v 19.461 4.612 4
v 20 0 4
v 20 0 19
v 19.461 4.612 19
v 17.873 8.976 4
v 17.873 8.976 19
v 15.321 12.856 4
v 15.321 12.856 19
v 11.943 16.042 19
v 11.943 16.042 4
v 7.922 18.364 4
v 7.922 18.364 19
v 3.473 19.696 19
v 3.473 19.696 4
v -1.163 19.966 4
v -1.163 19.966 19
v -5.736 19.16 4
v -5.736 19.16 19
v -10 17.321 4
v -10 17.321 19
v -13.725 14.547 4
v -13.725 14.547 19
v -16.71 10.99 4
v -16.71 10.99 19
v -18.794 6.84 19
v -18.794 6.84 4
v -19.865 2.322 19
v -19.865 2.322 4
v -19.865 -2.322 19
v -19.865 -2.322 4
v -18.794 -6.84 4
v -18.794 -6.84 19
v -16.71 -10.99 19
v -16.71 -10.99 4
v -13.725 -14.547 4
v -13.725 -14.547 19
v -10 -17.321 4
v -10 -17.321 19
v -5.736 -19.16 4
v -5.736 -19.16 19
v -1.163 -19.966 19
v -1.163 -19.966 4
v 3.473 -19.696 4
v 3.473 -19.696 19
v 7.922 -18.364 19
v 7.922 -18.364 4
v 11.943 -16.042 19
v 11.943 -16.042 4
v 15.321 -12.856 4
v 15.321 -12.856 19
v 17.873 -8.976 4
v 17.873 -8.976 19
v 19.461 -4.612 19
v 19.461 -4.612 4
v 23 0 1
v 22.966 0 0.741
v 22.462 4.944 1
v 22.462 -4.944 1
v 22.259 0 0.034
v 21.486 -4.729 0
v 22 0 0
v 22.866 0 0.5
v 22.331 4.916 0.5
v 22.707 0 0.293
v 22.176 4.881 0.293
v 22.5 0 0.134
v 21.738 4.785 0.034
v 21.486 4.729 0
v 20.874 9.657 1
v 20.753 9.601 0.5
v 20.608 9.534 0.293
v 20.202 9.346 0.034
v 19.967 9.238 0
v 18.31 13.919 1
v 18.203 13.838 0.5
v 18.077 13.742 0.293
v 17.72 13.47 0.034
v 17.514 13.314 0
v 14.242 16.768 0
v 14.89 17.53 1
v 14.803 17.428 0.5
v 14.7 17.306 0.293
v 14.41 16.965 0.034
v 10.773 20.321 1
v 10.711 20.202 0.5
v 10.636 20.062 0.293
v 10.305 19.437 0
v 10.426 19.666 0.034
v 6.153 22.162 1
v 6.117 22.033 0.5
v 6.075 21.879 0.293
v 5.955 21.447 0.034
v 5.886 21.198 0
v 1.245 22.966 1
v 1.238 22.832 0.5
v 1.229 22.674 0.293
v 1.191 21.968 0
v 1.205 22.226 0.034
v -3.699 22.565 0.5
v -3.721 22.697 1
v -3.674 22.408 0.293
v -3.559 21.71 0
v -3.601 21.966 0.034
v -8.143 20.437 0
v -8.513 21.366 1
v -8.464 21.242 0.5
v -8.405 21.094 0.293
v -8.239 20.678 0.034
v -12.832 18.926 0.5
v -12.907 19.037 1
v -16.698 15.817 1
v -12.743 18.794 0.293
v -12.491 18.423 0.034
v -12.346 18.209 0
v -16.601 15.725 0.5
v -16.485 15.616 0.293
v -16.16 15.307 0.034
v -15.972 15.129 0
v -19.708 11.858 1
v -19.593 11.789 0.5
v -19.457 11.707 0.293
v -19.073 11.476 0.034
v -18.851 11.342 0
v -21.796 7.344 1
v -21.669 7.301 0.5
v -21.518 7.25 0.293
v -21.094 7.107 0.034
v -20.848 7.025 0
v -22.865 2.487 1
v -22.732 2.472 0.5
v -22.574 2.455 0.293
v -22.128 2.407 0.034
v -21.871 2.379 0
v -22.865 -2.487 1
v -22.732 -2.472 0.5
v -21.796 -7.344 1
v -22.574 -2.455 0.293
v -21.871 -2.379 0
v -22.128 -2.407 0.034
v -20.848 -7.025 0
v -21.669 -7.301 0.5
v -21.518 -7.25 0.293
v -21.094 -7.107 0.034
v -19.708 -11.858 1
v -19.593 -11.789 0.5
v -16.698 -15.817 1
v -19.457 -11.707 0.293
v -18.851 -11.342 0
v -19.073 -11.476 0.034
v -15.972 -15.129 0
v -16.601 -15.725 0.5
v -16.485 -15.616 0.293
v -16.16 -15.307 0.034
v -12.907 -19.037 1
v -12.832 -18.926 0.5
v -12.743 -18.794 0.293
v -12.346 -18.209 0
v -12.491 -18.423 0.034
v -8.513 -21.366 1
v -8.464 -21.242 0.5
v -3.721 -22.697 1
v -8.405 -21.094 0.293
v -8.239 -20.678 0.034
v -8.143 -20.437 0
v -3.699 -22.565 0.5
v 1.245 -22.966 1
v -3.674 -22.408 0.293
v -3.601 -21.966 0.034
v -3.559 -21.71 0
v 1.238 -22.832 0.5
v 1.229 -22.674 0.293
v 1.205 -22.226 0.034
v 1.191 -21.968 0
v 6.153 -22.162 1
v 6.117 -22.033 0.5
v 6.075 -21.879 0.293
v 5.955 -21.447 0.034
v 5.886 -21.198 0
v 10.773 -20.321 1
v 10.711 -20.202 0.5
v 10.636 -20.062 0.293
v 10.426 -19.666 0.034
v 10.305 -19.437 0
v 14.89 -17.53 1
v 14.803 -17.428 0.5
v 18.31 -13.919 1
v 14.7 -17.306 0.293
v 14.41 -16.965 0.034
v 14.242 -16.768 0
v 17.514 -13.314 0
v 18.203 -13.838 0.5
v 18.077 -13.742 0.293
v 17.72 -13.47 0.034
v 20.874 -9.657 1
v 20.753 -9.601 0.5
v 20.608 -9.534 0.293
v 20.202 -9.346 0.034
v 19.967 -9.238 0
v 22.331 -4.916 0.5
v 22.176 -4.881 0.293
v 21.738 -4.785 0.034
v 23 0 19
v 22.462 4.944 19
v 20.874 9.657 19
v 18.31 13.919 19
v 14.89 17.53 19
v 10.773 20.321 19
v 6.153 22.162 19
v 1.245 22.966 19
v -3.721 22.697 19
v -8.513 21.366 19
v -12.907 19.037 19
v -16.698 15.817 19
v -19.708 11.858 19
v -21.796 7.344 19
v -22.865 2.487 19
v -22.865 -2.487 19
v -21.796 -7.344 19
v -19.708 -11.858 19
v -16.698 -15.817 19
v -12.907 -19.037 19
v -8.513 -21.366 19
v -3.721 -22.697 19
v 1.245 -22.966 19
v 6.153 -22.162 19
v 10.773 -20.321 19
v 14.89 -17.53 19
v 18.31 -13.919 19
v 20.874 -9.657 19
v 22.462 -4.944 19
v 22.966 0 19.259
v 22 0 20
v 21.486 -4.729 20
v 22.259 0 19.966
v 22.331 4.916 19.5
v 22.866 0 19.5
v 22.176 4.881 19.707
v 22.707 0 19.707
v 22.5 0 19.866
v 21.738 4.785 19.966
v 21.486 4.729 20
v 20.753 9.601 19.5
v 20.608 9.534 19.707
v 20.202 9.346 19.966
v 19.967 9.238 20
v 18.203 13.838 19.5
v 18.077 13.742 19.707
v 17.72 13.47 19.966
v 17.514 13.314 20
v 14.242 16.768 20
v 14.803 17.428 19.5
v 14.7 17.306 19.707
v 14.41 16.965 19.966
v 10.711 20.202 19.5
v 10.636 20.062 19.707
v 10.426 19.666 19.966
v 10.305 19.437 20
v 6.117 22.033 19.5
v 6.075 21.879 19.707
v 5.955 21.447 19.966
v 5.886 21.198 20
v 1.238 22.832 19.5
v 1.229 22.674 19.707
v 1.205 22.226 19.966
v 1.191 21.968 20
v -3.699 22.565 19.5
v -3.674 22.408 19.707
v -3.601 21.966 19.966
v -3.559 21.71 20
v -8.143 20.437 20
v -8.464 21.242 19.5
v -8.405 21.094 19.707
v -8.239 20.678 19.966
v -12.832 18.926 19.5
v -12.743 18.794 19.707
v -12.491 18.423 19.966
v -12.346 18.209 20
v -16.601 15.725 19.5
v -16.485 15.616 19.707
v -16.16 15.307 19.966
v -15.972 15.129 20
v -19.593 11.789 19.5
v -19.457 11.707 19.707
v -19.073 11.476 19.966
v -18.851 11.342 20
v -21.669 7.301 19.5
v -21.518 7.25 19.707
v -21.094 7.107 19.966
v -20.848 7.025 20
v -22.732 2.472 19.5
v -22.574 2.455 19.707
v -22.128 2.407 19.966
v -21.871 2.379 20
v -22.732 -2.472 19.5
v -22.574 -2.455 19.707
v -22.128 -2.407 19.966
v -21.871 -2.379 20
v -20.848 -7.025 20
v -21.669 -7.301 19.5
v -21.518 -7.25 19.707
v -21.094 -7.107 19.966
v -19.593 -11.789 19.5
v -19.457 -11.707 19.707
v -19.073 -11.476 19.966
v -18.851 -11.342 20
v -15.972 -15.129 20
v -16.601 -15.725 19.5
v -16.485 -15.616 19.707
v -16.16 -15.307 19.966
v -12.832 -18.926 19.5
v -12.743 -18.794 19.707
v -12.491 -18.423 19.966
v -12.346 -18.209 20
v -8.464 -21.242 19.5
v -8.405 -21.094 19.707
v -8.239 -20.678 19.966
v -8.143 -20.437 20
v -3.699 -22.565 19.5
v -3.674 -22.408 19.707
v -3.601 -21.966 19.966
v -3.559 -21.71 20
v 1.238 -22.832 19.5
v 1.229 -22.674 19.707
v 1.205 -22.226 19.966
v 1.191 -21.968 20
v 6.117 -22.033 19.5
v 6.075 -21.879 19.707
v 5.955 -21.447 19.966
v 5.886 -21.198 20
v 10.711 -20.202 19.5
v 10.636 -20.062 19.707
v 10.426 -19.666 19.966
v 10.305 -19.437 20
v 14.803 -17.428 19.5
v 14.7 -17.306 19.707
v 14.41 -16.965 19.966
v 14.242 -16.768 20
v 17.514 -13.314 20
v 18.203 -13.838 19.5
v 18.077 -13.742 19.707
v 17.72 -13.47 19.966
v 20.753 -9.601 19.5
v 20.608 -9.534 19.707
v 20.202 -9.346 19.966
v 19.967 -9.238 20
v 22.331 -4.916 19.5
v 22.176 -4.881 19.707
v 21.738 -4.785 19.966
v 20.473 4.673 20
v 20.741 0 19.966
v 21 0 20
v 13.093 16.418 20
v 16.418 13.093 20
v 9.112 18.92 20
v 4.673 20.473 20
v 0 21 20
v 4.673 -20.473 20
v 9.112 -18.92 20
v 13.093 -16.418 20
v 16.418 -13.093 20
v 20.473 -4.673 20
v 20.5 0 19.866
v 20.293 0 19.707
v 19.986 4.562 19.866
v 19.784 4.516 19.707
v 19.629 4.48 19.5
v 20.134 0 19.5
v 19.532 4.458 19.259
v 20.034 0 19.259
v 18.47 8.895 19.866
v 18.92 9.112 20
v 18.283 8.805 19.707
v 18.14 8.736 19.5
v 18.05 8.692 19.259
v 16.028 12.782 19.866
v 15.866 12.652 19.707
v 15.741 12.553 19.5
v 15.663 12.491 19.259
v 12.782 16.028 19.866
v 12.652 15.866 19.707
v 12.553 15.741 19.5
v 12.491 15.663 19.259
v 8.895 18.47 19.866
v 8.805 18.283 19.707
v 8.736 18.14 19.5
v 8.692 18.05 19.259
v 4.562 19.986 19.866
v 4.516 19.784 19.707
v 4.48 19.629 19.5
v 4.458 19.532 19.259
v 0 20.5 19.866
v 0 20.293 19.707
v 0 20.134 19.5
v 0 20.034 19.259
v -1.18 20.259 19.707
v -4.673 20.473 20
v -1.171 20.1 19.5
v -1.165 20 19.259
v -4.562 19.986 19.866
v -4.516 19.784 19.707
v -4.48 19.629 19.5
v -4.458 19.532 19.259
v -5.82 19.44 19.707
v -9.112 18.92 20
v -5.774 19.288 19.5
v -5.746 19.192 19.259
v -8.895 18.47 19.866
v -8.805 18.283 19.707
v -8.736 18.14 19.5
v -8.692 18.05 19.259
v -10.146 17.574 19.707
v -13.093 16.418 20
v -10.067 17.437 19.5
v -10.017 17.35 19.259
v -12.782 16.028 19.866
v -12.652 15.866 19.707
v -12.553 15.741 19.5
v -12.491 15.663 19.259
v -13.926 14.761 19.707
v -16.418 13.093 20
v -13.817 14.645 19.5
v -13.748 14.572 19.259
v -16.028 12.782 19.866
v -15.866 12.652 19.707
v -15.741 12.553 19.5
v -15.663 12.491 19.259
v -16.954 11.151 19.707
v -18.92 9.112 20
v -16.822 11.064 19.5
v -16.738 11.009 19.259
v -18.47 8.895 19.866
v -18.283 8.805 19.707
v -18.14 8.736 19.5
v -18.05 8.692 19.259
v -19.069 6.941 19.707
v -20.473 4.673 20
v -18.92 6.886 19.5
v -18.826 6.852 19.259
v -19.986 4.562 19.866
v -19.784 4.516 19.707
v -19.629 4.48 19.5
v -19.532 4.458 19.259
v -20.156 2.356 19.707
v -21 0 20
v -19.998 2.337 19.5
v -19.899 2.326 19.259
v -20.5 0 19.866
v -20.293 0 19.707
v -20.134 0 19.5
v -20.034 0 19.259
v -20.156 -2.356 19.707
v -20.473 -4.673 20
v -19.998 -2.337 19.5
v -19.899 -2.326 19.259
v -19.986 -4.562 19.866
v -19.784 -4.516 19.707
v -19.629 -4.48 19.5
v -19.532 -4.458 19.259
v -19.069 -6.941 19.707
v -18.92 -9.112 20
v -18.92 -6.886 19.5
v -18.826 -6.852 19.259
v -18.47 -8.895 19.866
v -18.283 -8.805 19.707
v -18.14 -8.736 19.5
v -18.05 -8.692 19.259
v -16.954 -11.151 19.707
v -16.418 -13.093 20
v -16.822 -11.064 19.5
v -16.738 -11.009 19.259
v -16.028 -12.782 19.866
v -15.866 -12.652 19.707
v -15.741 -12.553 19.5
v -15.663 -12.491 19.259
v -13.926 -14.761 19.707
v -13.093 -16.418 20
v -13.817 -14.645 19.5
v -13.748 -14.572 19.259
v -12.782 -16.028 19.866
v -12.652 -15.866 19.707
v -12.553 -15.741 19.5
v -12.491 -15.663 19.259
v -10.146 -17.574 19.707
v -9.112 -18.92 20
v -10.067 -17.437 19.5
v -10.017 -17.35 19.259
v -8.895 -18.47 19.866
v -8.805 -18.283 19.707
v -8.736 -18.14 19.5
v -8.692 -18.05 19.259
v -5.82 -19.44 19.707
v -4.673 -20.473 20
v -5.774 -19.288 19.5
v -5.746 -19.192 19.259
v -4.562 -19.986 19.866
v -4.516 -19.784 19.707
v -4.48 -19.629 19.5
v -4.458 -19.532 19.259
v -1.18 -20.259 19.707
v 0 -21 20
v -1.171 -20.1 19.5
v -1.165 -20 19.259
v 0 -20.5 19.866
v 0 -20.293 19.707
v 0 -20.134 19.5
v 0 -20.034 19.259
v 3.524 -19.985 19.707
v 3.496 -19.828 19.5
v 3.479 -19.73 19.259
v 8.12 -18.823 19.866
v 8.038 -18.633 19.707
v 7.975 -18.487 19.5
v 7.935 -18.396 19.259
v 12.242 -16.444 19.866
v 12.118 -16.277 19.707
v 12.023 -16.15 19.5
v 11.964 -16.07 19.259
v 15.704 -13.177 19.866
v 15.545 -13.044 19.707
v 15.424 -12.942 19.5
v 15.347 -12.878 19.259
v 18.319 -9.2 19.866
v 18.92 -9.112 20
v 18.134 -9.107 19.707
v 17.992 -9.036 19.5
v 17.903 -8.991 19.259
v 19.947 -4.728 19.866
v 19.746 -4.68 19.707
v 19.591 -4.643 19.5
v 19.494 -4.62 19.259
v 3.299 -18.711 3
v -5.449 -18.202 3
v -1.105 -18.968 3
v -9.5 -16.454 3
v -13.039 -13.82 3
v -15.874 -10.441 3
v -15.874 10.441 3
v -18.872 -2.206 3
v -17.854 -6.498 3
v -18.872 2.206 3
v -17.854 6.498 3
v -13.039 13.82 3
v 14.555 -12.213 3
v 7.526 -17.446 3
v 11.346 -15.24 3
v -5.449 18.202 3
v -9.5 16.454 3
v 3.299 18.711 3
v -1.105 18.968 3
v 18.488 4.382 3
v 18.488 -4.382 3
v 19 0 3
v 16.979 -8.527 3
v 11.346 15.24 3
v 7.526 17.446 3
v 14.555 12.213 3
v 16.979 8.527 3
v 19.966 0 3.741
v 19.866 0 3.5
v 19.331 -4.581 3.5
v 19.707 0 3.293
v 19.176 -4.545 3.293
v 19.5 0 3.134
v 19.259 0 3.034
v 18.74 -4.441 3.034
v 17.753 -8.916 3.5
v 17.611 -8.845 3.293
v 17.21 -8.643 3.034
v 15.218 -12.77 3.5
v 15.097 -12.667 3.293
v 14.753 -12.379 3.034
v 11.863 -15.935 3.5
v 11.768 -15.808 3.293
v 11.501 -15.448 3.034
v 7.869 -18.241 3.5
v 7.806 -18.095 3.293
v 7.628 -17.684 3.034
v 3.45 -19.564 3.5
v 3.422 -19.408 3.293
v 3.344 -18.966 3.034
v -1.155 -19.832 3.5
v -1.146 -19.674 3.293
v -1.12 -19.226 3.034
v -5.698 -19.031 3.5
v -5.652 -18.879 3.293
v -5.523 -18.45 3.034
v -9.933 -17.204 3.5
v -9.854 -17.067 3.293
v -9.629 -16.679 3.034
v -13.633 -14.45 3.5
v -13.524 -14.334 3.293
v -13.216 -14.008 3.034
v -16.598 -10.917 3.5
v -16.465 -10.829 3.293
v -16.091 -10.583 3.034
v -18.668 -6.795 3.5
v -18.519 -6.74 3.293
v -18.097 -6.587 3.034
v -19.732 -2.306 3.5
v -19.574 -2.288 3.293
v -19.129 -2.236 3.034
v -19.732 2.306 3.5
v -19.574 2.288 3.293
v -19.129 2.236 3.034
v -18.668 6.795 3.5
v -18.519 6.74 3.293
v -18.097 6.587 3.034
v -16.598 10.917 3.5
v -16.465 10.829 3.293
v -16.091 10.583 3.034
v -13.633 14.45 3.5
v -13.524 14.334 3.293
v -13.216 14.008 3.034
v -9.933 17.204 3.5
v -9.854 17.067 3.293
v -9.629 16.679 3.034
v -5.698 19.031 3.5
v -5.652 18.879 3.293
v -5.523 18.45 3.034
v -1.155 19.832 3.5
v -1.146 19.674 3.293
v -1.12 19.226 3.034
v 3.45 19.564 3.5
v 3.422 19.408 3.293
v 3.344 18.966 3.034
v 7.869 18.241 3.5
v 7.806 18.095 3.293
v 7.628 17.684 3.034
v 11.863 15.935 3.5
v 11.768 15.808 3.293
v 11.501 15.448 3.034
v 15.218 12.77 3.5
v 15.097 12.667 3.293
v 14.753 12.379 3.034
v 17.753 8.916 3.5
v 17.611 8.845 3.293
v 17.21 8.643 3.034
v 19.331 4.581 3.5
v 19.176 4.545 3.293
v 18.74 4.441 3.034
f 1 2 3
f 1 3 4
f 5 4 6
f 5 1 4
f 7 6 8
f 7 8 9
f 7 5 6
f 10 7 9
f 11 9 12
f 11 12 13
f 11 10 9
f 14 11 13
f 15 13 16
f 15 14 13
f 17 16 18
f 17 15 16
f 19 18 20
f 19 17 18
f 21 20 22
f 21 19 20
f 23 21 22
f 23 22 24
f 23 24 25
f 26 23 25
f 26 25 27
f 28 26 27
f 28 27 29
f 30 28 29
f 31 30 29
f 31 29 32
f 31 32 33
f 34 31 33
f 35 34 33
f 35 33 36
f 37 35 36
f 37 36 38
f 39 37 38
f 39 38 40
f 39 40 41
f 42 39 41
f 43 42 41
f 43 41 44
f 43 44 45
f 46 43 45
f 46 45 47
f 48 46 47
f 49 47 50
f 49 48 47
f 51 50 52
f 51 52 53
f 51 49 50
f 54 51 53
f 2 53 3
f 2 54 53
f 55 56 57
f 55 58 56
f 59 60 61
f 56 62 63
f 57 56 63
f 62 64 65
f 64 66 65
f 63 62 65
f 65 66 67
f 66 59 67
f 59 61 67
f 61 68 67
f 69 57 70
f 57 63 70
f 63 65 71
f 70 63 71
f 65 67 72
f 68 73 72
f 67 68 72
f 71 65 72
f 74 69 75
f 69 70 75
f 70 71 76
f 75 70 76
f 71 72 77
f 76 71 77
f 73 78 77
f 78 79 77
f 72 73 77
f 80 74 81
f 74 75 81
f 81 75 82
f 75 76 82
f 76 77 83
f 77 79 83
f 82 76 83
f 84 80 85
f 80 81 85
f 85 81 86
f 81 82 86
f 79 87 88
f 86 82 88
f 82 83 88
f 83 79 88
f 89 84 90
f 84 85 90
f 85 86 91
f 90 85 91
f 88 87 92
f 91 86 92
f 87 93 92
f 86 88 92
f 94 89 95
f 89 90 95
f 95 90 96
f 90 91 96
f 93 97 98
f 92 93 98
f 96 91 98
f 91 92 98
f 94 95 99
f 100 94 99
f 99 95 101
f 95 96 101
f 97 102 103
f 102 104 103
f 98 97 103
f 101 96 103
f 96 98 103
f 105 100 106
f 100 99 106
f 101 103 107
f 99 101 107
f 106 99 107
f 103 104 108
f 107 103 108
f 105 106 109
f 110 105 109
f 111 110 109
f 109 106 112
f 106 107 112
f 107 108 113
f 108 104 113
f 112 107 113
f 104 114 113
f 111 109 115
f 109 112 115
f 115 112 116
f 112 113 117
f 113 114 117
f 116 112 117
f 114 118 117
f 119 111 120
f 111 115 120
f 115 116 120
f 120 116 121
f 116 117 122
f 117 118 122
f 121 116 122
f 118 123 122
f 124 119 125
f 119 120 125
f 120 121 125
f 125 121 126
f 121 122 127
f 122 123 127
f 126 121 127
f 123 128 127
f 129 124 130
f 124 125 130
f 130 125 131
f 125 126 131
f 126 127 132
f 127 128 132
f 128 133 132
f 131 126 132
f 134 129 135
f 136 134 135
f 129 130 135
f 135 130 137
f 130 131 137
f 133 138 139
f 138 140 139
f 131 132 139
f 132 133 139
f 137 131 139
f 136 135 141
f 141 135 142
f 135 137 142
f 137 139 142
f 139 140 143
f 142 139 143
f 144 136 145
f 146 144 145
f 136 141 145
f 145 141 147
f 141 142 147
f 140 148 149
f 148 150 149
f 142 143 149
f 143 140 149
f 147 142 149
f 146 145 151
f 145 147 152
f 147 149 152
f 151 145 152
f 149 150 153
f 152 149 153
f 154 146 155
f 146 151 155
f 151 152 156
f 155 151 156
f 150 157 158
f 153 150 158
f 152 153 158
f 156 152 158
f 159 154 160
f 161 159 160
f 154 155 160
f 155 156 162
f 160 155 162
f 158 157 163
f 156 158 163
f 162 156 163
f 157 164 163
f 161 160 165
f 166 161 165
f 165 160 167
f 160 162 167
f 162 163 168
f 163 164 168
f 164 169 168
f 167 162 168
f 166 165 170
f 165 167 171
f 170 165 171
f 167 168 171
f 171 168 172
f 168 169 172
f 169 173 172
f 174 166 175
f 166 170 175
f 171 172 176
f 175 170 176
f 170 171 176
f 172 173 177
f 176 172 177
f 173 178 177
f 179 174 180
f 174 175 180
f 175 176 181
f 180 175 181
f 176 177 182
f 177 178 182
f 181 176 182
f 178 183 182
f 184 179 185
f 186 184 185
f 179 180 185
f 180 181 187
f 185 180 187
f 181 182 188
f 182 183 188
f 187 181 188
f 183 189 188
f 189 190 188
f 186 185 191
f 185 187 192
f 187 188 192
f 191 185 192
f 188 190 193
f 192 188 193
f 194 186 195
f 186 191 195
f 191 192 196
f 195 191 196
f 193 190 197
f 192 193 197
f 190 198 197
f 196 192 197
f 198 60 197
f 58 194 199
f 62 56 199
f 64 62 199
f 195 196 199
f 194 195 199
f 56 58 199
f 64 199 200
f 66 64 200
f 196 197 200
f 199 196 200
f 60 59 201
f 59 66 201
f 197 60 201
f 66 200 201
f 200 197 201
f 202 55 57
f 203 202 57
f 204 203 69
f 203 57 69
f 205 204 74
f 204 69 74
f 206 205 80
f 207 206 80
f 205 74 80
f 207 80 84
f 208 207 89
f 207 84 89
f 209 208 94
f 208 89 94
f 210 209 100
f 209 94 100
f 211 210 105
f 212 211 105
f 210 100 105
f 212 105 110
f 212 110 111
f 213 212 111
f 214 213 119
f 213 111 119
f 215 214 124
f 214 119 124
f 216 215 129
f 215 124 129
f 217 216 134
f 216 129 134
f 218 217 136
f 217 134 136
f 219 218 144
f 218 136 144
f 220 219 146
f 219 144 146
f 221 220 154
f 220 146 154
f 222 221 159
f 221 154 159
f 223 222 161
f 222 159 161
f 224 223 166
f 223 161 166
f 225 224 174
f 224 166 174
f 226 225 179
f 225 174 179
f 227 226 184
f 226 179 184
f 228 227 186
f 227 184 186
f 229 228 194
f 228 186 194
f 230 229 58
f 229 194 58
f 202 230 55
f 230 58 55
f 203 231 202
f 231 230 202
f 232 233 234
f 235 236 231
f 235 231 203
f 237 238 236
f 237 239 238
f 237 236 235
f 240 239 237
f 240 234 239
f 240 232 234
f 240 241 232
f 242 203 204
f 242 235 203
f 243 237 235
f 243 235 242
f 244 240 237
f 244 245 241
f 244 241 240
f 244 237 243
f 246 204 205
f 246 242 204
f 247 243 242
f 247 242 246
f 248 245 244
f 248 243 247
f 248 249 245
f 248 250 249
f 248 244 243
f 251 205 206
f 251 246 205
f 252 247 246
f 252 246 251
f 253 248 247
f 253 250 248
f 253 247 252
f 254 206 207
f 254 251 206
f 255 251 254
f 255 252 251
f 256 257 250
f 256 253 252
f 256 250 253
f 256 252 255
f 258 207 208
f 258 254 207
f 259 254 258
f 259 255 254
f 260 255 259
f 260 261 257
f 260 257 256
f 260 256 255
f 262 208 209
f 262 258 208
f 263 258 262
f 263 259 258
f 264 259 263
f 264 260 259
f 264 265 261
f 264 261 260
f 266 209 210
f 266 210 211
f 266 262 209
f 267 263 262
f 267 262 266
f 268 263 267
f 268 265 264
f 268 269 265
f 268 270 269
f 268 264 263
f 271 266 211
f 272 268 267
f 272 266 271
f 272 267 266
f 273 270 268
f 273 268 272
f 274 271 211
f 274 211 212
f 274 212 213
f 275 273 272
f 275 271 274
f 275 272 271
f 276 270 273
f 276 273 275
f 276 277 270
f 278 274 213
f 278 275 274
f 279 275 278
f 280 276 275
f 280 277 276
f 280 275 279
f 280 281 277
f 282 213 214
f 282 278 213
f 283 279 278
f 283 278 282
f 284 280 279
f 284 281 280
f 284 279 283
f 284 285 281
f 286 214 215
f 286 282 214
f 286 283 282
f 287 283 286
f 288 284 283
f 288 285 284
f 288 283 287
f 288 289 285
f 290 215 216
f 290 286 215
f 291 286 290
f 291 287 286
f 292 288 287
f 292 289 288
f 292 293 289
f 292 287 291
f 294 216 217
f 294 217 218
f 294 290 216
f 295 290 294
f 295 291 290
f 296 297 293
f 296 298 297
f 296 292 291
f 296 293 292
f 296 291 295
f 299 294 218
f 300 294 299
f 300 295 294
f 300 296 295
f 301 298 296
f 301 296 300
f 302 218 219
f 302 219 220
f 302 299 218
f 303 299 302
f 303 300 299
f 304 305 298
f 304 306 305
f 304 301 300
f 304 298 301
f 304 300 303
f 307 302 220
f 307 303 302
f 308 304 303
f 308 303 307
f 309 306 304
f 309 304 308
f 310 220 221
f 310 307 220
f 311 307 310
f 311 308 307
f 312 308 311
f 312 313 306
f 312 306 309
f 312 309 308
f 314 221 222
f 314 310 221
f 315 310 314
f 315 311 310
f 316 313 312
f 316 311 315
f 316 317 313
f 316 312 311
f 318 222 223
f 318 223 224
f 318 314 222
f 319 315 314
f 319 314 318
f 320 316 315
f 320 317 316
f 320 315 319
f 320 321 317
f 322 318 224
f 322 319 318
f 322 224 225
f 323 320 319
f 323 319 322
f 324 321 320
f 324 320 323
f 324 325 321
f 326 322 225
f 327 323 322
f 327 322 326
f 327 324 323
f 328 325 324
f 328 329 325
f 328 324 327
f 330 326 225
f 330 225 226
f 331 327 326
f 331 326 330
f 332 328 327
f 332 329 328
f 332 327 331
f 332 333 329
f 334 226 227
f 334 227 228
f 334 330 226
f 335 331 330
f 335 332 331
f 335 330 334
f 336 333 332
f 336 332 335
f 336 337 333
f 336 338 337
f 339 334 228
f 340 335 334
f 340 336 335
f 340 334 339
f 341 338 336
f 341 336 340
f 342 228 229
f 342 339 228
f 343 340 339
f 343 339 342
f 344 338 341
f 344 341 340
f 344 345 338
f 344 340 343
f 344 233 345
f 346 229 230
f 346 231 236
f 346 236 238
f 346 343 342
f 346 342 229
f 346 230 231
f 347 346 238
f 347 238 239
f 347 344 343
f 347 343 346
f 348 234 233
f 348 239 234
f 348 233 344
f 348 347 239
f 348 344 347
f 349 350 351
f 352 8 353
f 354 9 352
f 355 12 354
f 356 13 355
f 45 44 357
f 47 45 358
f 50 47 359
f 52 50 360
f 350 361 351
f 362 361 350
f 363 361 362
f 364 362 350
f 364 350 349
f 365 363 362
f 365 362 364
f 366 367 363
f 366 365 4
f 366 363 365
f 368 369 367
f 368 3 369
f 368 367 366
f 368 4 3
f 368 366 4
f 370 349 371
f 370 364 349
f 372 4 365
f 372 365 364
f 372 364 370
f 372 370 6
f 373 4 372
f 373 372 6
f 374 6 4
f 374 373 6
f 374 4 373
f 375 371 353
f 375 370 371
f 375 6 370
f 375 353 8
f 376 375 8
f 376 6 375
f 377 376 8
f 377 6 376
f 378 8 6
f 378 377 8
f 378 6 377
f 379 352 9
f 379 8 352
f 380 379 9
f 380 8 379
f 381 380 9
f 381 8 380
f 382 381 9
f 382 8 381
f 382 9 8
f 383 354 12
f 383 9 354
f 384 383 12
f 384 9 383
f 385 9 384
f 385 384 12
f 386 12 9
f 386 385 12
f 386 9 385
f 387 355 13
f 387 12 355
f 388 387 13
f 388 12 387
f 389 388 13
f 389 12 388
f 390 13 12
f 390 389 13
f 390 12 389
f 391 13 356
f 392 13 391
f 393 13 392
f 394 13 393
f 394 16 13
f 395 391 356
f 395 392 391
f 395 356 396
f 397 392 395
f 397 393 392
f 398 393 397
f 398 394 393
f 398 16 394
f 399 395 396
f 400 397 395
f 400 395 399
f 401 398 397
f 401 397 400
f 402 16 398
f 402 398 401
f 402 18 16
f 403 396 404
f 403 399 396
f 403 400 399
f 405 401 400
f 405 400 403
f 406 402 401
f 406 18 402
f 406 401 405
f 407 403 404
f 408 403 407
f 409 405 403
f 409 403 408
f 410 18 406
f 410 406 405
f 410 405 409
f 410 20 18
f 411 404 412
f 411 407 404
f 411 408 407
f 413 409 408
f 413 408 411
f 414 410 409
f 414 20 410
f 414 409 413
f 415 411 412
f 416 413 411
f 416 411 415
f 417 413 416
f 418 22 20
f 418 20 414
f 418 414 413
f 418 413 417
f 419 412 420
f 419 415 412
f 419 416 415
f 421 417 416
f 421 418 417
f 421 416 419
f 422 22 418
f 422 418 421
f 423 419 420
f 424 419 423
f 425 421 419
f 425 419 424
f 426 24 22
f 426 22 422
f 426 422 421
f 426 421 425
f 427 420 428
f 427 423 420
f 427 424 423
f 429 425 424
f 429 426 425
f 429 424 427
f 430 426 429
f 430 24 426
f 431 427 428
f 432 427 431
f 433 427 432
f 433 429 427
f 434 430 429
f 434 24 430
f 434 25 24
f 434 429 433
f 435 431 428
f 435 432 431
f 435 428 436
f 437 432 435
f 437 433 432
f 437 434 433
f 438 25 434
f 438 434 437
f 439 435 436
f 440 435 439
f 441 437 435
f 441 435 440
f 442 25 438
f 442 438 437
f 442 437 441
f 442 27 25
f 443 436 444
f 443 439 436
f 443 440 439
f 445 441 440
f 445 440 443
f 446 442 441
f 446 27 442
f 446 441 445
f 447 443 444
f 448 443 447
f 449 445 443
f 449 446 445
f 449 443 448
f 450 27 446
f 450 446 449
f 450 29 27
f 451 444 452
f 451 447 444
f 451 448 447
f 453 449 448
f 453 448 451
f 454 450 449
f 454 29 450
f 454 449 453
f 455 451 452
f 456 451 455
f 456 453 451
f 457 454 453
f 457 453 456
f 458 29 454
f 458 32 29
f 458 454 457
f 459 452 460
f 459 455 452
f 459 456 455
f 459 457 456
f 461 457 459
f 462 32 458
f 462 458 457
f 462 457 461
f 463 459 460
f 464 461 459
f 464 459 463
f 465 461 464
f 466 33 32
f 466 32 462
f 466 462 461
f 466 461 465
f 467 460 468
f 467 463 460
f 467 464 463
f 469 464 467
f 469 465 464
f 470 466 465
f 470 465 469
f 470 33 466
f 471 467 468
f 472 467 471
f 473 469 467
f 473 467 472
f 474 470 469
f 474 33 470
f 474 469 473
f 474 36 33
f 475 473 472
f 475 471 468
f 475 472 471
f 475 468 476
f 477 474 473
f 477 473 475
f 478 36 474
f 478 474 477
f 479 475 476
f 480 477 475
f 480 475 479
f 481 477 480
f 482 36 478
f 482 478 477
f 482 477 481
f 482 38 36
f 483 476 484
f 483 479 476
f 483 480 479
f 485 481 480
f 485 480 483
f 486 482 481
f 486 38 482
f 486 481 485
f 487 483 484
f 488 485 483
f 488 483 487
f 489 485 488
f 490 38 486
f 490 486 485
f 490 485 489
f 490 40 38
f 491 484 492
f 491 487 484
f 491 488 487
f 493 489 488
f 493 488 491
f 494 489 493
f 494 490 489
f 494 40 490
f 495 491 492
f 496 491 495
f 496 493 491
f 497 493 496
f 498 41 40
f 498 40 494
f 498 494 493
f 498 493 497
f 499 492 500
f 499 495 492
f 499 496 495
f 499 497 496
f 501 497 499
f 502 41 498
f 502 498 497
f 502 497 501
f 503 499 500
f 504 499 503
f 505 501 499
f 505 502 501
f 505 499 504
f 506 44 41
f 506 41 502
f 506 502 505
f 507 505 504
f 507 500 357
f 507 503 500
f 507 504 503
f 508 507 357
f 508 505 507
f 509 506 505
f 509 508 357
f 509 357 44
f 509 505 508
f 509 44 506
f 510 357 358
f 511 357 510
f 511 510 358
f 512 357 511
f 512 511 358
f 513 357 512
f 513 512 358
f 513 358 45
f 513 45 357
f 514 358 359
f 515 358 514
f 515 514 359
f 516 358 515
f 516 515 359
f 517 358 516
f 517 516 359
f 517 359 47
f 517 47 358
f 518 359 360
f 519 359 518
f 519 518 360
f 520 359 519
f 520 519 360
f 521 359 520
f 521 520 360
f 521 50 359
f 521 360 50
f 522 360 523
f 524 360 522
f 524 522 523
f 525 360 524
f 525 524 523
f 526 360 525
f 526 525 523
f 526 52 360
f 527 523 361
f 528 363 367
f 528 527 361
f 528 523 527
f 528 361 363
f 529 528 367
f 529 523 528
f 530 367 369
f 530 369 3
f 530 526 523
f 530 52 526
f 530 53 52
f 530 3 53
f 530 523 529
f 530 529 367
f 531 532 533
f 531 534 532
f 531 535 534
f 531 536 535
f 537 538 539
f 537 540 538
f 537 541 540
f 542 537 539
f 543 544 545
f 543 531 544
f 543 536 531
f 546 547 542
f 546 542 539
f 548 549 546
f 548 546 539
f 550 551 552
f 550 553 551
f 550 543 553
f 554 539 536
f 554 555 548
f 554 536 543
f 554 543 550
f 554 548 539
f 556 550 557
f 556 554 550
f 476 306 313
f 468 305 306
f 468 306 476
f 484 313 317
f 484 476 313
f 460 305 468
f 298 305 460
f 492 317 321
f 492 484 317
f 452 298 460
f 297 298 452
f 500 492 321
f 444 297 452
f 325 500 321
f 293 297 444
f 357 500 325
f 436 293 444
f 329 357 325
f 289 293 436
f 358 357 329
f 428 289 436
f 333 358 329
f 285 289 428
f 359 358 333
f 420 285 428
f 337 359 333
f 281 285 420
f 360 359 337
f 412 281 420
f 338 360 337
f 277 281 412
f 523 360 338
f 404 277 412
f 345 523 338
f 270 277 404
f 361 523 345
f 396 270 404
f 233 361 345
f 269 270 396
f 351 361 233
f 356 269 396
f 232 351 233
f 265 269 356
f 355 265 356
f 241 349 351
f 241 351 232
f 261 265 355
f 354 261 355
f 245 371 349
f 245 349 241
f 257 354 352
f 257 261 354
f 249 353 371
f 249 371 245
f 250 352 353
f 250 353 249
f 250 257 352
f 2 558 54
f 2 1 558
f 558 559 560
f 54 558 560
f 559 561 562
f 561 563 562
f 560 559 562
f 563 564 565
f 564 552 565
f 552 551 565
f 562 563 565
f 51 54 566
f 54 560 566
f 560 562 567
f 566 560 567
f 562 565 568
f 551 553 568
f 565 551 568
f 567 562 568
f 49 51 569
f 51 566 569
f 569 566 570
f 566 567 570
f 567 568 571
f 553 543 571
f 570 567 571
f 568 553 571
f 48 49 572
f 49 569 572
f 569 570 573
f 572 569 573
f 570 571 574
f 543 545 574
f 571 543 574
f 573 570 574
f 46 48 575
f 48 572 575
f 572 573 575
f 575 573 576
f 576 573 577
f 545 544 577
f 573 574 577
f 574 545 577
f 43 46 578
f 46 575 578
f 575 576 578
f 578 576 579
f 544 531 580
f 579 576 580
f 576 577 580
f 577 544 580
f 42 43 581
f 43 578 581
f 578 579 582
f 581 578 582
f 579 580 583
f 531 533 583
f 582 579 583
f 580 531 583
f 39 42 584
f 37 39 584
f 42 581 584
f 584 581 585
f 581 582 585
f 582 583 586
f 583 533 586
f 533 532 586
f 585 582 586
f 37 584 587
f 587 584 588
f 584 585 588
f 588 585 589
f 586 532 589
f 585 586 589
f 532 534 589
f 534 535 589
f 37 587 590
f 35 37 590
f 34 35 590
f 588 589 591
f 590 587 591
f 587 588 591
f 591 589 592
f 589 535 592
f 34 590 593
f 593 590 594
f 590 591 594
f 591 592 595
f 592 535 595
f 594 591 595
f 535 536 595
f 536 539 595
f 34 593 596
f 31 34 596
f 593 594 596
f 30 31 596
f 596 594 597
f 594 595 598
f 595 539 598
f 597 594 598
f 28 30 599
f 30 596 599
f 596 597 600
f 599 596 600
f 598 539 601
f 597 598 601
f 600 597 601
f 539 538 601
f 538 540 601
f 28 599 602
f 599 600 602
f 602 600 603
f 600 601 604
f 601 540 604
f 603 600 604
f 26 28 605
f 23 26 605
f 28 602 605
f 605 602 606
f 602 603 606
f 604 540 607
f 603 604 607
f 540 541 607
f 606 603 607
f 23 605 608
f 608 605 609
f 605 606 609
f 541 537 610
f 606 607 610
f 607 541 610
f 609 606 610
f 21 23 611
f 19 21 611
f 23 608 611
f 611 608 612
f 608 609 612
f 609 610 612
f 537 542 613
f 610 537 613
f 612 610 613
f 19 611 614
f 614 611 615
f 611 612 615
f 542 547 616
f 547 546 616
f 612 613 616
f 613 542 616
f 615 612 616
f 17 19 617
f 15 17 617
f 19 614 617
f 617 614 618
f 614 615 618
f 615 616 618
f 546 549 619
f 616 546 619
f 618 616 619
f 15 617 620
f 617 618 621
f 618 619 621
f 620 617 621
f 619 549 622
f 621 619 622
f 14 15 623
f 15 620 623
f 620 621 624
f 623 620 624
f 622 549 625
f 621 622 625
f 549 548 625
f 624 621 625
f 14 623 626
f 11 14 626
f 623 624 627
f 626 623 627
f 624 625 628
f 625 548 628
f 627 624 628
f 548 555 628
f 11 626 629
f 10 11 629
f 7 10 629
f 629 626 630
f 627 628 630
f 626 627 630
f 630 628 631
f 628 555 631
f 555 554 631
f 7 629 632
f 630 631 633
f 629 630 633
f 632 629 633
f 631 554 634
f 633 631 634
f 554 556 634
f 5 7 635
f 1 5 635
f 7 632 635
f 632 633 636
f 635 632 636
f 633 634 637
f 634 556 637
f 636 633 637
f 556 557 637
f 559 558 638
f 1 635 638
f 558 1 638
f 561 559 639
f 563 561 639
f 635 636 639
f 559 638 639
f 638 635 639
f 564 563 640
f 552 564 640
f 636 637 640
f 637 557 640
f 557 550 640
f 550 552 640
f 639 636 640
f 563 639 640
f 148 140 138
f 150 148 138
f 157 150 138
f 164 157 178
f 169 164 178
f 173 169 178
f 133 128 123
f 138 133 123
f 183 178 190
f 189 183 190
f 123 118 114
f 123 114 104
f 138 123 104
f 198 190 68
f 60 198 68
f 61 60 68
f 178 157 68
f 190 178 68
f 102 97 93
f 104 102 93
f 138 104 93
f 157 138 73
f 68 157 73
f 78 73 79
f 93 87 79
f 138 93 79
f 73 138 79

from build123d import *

# Parameters (mm, degrees)
F0_R     = 23
F0_R_2   = 20
F1_DEPTH = 20
F2_R     = 23
F3_DEPTH = 3
F4_R     = 1


with BuildPart() as f1:
    # F0 (on Top) → F1 (new body)
    with BuildSketch(Plane.XY):
        Circle(F0_R)
        Circle(F0_R_2, mode=Mode.SUBTRACT)
    extrude(amount=F1_DEPTH)

    # F2 (on Top) → F3 (join)
    with BuildSketch(Plane.XY):
        Circle(F2_R)
    extrude(amount=F3_DEPTH)

    # F4
    f4_edges = [f1.edges().sort_by_distance(p)[0] for p in [
        (-20, 0, 3),
        (-20, 0, 20),
        (-23, 0, 20),
        (-23, 0, 0),
        (23, 0, 10),
    ]]
    fillet(f4_edges, radius=F4_R)


solid = f1.part
